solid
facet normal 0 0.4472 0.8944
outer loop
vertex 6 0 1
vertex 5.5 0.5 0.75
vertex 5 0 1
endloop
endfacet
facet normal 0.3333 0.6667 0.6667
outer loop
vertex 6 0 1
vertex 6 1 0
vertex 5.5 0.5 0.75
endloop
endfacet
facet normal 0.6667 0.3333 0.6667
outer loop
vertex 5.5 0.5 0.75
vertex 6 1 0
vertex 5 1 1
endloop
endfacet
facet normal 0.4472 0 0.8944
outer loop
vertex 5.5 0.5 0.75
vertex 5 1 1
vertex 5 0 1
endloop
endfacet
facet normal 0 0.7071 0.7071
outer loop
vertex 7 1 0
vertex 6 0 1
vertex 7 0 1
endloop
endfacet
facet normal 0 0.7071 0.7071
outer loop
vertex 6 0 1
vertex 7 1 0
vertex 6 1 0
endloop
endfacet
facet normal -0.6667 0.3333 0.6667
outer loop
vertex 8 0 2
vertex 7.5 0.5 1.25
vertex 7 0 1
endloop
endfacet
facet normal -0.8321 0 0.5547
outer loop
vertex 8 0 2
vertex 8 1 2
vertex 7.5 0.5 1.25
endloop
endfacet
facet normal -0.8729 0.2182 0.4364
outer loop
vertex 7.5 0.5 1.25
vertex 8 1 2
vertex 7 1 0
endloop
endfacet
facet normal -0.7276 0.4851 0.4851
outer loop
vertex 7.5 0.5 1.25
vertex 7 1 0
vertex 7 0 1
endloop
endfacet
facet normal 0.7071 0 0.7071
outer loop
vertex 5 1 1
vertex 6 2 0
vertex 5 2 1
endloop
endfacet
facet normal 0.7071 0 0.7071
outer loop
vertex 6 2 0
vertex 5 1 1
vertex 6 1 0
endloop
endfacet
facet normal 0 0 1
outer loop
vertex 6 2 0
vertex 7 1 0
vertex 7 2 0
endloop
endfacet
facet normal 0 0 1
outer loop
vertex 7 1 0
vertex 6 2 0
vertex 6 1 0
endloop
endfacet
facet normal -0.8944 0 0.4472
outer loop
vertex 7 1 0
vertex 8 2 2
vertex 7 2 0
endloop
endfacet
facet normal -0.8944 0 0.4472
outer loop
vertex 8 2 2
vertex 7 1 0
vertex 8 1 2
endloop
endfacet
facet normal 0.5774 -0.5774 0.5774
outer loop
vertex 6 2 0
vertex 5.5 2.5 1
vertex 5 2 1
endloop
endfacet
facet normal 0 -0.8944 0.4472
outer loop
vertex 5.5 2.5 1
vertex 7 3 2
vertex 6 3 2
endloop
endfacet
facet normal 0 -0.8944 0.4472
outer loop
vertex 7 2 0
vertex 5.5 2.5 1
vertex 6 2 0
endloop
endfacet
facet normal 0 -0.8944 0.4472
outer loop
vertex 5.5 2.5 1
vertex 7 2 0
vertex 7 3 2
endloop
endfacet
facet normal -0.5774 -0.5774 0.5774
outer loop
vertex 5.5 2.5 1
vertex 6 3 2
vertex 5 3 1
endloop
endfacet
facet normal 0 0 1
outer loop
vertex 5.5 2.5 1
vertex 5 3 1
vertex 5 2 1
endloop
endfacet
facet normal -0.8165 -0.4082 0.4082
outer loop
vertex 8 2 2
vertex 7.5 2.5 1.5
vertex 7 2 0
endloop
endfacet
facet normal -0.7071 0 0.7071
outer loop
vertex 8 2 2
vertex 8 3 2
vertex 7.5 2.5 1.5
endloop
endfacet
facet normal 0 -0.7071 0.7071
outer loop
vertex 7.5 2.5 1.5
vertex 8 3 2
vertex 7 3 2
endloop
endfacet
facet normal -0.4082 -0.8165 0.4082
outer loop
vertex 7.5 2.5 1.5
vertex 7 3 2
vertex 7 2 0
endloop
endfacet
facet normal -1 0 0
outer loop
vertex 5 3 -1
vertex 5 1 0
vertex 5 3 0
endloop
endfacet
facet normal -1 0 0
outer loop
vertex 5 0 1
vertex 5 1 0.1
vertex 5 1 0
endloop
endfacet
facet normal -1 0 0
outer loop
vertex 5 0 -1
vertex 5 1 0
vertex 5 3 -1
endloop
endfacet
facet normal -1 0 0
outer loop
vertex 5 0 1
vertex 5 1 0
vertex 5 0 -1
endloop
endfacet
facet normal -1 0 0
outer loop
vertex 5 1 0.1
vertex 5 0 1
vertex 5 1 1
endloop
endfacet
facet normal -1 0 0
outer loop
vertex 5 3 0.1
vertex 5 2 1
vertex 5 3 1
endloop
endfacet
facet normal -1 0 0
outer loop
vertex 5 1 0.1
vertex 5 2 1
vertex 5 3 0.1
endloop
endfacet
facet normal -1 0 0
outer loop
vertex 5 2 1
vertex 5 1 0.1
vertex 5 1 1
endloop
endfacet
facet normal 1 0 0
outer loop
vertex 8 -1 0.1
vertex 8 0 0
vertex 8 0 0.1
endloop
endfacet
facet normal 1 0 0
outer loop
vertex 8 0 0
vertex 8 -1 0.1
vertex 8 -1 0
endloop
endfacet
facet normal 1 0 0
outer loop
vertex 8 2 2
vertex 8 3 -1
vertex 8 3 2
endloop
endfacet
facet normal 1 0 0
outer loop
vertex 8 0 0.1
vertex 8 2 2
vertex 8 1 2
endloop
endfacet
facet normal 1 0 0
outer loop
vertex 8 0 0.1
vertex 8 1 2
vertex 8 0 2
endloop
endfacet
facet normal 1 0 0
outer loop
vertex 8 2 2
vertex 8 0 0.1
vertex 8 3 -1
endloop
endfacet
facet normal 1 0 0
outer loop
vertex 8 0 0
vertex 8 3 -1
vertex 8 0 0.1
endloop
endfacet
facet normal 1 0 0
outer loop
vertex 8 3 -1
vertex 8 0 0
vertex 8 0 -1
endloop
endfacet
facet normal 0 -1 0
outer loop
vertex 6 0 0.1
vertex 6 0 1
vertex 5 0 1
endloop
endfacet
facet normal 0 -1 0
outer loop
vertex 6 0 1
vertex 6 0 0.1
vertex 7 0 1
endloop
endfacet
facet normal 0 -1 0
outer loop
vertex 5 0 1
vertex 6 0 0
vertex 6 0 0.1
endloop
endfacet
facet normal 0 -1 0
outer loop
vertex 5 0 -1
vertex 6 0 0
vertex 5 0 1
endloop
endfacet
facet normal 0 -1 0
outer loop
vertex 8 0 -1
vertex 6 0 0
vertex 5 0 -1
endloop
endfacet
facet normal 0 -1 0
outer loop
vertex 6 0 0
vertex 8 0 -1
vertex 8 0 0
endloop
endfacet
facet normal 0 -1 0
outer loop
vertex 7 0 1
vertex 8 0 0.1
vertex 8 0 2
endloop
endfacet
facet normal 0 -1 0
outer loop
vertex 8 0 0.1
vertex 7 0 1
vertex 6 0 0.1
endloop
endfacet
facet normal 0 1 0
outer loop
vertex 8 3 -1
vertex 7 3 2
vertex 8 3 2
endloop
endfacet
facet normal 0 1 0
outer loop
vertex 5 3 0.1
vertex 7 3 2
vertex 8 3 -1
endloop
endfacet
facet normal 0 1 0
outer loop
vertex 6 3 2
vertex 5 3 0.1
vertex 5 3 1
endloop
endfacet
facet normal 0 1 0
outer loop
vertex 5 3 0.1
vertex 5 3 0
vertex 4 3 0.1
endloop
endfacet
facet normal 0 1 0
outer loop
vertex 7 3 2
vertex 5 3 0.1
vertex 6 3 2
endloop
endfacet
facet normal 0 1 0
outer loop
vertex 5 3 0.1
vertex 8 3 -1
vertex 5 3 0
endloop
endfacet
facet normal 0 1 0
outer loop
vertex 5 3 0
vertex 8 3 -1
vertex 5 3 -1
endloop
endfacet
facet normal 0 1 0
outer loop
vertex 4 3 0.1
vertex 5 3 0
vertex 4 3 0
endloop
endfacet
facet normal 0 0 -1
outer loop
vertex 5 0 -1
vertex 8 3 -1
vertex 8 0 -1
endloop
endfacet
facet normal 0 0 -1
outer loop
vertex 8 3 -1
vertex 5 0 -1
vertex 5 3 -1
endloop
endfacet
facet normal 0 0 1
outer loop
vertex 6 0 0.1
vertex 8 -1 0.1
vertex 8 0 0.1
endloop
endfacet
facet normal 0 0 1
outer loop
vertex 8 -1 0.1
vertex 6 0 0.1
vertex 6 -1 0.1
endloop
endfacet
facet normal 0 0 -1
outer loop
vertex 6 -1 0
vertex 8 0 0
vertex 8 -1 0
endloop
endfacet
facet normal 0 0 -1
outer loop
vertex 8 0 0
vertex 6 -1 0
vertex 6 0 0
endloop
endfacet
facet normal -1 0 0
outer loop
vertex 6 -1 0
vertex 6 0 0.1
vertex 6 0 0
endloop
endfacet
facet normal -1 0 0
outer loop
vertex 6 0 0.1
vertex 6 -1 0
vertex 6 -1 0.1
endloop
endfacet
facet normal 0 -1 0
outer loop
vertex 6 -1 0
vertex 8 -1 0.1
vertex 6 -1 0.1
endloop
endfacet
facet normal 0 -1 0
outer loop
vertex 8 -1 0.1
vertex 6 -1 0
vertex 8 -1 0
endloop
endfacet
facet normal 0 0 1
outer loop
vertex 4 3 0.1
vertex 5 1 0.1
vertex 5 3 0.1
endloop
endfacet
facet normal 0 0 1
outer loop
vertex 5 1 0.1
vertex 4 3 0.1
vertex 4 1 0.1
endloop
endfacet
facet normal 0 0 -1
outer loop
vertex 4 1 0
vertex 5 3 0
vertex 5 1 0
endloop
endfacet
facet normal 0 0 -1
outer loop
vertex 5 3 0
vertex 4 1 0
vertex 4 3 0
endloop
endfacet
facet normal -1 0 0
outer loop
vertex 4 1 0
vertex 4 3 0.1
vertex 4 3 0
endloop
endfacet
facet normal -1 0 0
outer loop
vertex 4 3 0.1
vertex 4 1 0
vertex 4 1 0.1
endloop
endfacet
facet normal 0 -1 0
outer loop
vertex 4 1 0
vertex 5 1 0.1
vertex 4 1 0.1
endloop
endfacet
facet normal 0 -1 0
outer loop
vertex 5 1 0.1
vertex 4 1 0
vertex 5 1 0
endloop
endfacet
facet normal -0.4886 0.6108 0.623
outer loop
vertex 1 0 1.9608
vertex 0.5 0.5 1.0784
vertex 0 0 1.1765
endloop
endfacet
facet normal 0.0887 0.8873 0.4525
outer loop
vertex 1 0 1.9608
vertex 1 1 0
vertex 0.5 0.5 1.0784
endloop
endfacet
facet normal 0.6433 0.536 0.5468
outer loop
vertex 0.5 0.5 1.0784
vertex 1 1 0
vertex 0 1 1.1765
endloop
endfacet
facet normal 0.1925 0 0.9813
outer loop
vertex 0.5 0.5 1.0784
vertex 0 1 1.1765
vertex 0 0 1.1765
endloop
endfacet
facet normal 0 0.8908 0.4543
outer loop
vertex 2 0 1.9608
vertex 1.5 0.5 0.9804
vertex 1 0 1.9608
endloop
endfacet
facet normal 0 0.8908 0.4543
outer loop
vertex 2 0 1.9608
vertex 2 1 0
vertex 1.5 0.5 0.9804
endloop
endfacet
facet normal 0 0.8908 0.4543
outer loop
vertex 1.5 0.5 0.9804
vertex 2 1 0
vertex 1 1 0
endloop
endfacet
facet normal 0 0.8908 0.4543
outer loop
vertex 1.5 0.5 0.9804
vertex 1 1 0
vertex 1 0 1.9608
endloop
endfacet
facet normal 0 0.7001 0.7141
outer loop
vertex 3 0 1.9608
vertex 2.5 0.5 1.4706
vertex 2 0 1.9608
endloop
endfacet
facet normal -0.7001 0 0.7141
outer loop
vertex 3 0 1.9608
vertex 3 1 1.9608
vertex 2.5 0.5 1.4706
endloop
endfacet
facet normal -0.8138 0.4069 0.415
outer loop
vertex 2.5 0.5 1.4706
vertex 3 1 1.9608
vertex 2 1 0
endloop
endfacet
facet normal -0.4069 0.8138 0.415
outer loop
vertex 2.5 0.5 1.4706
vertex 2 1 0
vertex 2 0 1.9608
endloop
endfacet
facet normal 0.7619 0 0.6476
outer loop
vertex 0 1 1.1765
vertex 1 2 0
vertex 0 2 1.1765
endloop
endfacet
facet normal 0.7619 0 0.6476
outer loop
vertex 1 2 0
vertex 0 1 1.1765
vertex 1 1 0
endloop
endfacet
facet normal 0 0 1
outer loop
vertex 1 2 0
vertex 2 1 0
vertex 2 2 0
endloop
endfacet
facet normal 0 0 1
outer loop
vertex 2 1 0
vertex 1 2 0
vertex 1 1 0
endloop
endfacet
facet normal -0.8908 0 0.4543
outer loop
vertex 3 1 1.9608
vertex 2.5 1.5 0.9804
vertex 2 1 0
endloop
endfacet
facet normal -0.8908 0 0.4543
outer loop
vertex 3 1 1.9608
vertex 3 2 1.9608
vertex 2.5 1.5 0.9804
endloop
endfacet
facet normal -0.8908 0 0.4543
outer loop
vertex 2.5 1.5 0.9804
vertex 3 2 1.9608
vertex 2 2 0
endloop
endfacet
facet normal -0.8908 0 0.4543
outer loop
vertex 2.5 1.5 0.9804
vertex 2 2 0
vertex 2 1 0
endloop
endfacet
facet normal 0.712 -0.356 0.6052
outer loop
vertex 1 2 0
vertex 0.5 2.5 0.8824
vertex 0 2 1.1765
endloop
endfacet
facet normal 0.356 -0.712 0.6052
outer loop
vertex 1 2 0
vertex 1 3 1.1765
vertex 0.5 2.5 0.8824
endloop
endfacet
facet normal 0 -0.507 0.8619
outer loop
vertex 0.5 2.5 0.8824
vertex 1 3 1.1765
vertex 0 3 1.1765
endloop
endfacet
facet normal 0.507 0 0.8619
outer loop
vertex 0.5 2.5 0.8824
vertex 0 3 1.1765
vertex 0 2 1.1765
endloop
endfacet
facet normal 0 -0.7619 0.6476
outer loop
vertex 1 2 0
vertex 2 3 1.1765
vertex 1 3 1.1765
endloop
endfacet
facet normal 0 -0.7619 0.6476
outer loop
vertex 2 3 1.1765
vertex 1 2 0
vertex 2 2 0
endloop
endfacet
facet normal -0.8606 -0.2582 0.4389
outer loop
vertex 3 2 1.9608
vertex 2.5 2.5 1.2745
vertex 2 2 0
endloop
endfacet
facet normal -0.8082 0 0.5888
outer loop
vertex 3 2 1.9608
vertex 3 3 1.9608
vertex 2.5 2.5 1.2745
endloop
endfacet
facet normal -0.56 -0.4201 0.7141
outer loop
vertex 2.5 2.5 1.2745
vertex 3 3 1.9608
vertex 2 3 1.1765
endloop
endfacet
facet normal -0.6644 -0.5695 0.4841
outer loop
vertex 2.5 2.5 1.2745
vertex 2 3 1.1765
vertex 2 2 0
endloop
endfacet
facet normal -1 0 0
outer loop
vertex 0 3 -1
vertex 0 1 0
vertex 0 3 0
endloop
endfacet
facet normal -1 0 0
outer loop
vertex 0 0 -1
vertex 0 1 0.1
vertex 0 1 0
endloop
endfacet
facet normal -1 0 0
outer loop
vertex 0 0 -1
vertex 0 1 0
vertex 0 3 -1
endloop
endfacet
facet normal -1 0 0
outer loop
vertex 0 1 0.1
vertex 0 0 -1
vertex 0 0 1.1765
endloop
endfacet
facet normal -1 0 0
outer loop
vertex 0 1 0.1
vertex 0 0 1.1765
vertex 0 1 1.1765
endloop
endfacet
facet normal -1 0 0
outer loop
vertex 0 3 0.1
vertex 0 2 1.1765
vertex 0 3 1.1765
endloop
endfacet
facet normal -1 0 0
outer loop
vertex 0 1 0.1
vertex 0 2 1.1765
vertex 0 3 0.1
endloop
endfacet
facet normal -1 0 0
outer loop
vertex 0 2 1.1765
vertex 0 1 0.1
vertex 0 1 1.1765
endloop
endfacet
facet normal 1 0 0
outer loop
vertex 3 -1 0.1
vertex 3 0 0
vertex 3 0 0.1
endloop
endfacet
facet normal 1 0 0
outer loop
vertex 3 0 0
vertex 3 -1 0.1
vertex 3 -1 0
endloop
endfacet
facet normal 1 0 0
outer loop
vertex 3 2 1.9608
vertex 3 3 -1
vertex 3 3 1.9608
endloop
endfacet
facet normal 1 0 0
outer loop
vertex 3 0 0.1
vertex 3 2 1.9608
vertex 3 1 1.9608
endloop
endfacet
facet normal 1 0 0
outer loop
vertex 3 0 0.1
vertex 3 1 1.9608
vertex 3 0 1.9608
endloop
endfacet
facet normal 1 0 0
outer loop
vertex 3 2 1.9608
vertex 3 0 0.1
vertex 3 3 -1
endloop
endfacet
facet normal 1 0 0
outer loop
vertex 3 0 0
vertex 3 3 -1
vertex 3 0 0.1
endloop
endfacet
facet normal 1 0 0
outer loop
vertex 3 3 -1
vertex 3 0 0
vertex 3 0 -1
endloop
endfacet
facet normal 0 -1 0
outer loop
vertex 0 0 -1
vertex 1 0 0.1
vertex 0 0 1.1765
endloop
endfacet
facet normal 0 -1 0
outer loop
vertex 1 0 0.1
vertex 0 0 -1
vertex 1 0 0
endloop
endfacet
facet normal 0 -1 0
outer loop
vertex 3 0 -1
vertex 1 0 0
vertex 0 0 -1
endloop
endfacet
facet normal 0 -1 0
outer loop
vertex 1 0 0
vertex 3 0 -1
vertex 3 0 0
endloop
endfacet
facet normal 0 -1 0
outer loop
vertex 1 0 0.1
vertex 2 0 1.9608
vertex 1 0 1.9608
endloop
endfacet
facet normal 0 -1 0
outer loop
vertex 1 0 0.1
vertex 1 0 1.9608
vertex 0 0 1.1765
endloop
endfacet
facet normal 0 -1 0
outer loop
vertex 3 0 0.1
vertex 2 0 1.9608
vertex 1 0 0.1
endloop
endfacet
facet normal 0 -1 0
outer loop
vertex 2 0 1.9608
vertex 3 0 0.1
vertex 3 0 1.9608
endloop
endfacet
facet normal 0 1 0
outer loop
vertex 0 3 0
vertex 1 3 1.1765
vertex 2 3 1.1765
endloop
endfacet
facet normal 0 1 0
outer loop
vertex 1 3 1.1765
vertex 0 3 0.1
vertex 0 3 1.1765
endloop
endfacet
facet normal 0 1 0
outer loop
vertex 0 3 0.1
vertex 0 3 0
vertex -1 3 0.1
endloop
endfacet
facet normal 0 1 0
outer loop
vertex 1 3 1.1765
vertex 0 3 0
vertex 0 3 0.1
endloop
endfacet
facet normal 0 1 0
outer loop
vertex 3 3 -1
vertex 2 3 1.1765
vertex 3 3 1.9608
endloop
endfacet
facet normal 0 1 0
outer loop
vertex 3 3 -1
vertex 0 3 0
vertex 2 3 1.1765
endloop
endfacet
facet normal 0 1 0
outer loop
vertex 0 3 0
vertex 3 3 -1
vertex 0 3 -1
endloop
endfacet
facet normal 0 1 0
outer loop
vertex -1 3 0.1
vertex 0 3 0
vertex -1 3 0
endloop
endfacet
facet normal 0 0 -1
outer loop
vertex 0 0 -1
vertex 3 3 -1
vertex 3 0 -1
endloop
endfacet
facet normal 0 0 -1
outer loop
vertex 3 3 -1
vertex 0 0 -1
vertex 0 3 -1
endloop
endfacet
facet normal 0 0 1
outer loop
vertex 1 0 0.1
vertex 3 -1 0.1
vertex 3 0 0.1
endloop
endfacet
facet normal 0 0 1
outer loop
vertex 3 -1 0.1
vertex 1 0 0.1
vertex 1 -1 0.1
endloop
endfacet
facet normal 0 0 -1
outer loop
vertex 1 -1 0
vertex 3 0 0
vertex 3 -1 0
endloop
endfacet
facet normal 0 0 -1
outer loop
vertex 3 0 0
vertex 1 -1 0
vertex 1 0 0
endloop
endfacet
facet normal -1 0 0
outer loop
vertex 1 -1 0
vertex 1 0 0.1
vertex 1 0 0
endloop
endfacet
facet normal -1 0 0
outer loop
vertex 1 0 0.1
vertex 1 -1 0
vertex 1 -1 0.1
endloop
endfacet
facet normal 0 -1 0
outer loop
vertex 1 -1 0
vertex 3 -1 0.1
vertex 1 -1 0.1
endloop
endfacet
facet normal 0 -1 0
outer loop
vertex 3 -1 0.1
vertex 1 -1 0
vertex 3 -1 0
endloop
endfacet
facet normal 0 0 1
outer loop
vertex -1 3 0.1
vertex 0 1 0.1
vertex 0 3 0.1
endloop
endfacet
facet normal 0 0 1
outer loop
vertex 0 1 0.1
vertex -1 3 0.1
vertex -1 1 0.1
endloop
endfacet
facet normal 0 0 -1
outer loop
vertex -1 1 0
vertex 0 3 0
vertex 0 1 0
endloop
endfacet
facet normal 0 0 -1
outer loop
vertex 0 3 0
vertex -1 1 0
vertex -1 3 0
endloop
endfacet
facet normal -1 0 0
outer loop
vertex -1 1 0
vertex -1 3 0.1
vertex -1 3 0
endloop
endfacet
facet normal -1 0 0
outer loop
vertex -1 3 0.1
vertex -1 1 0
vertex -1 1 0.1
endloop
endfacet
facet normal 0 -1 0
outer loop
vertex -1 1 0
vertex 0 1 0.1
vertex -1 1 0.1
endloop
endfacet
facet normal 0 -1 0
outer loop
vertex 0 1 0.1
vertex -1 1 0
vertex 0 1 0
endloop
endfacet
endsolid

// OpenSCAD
scale([1,1,1]) surface("issue1223b.png");
translate([1,-1,0]) cube([2,1,0.1]);
translate([-1,1,0]) cube([1,2,0.1]);

translate([5,0,0]) {
    surface("issue1223b.dat");
    translate([1,-1,0]) cube([2,1,0.1]);
    translate([-1,1,0]) cube([1,2,0.1]);
}
